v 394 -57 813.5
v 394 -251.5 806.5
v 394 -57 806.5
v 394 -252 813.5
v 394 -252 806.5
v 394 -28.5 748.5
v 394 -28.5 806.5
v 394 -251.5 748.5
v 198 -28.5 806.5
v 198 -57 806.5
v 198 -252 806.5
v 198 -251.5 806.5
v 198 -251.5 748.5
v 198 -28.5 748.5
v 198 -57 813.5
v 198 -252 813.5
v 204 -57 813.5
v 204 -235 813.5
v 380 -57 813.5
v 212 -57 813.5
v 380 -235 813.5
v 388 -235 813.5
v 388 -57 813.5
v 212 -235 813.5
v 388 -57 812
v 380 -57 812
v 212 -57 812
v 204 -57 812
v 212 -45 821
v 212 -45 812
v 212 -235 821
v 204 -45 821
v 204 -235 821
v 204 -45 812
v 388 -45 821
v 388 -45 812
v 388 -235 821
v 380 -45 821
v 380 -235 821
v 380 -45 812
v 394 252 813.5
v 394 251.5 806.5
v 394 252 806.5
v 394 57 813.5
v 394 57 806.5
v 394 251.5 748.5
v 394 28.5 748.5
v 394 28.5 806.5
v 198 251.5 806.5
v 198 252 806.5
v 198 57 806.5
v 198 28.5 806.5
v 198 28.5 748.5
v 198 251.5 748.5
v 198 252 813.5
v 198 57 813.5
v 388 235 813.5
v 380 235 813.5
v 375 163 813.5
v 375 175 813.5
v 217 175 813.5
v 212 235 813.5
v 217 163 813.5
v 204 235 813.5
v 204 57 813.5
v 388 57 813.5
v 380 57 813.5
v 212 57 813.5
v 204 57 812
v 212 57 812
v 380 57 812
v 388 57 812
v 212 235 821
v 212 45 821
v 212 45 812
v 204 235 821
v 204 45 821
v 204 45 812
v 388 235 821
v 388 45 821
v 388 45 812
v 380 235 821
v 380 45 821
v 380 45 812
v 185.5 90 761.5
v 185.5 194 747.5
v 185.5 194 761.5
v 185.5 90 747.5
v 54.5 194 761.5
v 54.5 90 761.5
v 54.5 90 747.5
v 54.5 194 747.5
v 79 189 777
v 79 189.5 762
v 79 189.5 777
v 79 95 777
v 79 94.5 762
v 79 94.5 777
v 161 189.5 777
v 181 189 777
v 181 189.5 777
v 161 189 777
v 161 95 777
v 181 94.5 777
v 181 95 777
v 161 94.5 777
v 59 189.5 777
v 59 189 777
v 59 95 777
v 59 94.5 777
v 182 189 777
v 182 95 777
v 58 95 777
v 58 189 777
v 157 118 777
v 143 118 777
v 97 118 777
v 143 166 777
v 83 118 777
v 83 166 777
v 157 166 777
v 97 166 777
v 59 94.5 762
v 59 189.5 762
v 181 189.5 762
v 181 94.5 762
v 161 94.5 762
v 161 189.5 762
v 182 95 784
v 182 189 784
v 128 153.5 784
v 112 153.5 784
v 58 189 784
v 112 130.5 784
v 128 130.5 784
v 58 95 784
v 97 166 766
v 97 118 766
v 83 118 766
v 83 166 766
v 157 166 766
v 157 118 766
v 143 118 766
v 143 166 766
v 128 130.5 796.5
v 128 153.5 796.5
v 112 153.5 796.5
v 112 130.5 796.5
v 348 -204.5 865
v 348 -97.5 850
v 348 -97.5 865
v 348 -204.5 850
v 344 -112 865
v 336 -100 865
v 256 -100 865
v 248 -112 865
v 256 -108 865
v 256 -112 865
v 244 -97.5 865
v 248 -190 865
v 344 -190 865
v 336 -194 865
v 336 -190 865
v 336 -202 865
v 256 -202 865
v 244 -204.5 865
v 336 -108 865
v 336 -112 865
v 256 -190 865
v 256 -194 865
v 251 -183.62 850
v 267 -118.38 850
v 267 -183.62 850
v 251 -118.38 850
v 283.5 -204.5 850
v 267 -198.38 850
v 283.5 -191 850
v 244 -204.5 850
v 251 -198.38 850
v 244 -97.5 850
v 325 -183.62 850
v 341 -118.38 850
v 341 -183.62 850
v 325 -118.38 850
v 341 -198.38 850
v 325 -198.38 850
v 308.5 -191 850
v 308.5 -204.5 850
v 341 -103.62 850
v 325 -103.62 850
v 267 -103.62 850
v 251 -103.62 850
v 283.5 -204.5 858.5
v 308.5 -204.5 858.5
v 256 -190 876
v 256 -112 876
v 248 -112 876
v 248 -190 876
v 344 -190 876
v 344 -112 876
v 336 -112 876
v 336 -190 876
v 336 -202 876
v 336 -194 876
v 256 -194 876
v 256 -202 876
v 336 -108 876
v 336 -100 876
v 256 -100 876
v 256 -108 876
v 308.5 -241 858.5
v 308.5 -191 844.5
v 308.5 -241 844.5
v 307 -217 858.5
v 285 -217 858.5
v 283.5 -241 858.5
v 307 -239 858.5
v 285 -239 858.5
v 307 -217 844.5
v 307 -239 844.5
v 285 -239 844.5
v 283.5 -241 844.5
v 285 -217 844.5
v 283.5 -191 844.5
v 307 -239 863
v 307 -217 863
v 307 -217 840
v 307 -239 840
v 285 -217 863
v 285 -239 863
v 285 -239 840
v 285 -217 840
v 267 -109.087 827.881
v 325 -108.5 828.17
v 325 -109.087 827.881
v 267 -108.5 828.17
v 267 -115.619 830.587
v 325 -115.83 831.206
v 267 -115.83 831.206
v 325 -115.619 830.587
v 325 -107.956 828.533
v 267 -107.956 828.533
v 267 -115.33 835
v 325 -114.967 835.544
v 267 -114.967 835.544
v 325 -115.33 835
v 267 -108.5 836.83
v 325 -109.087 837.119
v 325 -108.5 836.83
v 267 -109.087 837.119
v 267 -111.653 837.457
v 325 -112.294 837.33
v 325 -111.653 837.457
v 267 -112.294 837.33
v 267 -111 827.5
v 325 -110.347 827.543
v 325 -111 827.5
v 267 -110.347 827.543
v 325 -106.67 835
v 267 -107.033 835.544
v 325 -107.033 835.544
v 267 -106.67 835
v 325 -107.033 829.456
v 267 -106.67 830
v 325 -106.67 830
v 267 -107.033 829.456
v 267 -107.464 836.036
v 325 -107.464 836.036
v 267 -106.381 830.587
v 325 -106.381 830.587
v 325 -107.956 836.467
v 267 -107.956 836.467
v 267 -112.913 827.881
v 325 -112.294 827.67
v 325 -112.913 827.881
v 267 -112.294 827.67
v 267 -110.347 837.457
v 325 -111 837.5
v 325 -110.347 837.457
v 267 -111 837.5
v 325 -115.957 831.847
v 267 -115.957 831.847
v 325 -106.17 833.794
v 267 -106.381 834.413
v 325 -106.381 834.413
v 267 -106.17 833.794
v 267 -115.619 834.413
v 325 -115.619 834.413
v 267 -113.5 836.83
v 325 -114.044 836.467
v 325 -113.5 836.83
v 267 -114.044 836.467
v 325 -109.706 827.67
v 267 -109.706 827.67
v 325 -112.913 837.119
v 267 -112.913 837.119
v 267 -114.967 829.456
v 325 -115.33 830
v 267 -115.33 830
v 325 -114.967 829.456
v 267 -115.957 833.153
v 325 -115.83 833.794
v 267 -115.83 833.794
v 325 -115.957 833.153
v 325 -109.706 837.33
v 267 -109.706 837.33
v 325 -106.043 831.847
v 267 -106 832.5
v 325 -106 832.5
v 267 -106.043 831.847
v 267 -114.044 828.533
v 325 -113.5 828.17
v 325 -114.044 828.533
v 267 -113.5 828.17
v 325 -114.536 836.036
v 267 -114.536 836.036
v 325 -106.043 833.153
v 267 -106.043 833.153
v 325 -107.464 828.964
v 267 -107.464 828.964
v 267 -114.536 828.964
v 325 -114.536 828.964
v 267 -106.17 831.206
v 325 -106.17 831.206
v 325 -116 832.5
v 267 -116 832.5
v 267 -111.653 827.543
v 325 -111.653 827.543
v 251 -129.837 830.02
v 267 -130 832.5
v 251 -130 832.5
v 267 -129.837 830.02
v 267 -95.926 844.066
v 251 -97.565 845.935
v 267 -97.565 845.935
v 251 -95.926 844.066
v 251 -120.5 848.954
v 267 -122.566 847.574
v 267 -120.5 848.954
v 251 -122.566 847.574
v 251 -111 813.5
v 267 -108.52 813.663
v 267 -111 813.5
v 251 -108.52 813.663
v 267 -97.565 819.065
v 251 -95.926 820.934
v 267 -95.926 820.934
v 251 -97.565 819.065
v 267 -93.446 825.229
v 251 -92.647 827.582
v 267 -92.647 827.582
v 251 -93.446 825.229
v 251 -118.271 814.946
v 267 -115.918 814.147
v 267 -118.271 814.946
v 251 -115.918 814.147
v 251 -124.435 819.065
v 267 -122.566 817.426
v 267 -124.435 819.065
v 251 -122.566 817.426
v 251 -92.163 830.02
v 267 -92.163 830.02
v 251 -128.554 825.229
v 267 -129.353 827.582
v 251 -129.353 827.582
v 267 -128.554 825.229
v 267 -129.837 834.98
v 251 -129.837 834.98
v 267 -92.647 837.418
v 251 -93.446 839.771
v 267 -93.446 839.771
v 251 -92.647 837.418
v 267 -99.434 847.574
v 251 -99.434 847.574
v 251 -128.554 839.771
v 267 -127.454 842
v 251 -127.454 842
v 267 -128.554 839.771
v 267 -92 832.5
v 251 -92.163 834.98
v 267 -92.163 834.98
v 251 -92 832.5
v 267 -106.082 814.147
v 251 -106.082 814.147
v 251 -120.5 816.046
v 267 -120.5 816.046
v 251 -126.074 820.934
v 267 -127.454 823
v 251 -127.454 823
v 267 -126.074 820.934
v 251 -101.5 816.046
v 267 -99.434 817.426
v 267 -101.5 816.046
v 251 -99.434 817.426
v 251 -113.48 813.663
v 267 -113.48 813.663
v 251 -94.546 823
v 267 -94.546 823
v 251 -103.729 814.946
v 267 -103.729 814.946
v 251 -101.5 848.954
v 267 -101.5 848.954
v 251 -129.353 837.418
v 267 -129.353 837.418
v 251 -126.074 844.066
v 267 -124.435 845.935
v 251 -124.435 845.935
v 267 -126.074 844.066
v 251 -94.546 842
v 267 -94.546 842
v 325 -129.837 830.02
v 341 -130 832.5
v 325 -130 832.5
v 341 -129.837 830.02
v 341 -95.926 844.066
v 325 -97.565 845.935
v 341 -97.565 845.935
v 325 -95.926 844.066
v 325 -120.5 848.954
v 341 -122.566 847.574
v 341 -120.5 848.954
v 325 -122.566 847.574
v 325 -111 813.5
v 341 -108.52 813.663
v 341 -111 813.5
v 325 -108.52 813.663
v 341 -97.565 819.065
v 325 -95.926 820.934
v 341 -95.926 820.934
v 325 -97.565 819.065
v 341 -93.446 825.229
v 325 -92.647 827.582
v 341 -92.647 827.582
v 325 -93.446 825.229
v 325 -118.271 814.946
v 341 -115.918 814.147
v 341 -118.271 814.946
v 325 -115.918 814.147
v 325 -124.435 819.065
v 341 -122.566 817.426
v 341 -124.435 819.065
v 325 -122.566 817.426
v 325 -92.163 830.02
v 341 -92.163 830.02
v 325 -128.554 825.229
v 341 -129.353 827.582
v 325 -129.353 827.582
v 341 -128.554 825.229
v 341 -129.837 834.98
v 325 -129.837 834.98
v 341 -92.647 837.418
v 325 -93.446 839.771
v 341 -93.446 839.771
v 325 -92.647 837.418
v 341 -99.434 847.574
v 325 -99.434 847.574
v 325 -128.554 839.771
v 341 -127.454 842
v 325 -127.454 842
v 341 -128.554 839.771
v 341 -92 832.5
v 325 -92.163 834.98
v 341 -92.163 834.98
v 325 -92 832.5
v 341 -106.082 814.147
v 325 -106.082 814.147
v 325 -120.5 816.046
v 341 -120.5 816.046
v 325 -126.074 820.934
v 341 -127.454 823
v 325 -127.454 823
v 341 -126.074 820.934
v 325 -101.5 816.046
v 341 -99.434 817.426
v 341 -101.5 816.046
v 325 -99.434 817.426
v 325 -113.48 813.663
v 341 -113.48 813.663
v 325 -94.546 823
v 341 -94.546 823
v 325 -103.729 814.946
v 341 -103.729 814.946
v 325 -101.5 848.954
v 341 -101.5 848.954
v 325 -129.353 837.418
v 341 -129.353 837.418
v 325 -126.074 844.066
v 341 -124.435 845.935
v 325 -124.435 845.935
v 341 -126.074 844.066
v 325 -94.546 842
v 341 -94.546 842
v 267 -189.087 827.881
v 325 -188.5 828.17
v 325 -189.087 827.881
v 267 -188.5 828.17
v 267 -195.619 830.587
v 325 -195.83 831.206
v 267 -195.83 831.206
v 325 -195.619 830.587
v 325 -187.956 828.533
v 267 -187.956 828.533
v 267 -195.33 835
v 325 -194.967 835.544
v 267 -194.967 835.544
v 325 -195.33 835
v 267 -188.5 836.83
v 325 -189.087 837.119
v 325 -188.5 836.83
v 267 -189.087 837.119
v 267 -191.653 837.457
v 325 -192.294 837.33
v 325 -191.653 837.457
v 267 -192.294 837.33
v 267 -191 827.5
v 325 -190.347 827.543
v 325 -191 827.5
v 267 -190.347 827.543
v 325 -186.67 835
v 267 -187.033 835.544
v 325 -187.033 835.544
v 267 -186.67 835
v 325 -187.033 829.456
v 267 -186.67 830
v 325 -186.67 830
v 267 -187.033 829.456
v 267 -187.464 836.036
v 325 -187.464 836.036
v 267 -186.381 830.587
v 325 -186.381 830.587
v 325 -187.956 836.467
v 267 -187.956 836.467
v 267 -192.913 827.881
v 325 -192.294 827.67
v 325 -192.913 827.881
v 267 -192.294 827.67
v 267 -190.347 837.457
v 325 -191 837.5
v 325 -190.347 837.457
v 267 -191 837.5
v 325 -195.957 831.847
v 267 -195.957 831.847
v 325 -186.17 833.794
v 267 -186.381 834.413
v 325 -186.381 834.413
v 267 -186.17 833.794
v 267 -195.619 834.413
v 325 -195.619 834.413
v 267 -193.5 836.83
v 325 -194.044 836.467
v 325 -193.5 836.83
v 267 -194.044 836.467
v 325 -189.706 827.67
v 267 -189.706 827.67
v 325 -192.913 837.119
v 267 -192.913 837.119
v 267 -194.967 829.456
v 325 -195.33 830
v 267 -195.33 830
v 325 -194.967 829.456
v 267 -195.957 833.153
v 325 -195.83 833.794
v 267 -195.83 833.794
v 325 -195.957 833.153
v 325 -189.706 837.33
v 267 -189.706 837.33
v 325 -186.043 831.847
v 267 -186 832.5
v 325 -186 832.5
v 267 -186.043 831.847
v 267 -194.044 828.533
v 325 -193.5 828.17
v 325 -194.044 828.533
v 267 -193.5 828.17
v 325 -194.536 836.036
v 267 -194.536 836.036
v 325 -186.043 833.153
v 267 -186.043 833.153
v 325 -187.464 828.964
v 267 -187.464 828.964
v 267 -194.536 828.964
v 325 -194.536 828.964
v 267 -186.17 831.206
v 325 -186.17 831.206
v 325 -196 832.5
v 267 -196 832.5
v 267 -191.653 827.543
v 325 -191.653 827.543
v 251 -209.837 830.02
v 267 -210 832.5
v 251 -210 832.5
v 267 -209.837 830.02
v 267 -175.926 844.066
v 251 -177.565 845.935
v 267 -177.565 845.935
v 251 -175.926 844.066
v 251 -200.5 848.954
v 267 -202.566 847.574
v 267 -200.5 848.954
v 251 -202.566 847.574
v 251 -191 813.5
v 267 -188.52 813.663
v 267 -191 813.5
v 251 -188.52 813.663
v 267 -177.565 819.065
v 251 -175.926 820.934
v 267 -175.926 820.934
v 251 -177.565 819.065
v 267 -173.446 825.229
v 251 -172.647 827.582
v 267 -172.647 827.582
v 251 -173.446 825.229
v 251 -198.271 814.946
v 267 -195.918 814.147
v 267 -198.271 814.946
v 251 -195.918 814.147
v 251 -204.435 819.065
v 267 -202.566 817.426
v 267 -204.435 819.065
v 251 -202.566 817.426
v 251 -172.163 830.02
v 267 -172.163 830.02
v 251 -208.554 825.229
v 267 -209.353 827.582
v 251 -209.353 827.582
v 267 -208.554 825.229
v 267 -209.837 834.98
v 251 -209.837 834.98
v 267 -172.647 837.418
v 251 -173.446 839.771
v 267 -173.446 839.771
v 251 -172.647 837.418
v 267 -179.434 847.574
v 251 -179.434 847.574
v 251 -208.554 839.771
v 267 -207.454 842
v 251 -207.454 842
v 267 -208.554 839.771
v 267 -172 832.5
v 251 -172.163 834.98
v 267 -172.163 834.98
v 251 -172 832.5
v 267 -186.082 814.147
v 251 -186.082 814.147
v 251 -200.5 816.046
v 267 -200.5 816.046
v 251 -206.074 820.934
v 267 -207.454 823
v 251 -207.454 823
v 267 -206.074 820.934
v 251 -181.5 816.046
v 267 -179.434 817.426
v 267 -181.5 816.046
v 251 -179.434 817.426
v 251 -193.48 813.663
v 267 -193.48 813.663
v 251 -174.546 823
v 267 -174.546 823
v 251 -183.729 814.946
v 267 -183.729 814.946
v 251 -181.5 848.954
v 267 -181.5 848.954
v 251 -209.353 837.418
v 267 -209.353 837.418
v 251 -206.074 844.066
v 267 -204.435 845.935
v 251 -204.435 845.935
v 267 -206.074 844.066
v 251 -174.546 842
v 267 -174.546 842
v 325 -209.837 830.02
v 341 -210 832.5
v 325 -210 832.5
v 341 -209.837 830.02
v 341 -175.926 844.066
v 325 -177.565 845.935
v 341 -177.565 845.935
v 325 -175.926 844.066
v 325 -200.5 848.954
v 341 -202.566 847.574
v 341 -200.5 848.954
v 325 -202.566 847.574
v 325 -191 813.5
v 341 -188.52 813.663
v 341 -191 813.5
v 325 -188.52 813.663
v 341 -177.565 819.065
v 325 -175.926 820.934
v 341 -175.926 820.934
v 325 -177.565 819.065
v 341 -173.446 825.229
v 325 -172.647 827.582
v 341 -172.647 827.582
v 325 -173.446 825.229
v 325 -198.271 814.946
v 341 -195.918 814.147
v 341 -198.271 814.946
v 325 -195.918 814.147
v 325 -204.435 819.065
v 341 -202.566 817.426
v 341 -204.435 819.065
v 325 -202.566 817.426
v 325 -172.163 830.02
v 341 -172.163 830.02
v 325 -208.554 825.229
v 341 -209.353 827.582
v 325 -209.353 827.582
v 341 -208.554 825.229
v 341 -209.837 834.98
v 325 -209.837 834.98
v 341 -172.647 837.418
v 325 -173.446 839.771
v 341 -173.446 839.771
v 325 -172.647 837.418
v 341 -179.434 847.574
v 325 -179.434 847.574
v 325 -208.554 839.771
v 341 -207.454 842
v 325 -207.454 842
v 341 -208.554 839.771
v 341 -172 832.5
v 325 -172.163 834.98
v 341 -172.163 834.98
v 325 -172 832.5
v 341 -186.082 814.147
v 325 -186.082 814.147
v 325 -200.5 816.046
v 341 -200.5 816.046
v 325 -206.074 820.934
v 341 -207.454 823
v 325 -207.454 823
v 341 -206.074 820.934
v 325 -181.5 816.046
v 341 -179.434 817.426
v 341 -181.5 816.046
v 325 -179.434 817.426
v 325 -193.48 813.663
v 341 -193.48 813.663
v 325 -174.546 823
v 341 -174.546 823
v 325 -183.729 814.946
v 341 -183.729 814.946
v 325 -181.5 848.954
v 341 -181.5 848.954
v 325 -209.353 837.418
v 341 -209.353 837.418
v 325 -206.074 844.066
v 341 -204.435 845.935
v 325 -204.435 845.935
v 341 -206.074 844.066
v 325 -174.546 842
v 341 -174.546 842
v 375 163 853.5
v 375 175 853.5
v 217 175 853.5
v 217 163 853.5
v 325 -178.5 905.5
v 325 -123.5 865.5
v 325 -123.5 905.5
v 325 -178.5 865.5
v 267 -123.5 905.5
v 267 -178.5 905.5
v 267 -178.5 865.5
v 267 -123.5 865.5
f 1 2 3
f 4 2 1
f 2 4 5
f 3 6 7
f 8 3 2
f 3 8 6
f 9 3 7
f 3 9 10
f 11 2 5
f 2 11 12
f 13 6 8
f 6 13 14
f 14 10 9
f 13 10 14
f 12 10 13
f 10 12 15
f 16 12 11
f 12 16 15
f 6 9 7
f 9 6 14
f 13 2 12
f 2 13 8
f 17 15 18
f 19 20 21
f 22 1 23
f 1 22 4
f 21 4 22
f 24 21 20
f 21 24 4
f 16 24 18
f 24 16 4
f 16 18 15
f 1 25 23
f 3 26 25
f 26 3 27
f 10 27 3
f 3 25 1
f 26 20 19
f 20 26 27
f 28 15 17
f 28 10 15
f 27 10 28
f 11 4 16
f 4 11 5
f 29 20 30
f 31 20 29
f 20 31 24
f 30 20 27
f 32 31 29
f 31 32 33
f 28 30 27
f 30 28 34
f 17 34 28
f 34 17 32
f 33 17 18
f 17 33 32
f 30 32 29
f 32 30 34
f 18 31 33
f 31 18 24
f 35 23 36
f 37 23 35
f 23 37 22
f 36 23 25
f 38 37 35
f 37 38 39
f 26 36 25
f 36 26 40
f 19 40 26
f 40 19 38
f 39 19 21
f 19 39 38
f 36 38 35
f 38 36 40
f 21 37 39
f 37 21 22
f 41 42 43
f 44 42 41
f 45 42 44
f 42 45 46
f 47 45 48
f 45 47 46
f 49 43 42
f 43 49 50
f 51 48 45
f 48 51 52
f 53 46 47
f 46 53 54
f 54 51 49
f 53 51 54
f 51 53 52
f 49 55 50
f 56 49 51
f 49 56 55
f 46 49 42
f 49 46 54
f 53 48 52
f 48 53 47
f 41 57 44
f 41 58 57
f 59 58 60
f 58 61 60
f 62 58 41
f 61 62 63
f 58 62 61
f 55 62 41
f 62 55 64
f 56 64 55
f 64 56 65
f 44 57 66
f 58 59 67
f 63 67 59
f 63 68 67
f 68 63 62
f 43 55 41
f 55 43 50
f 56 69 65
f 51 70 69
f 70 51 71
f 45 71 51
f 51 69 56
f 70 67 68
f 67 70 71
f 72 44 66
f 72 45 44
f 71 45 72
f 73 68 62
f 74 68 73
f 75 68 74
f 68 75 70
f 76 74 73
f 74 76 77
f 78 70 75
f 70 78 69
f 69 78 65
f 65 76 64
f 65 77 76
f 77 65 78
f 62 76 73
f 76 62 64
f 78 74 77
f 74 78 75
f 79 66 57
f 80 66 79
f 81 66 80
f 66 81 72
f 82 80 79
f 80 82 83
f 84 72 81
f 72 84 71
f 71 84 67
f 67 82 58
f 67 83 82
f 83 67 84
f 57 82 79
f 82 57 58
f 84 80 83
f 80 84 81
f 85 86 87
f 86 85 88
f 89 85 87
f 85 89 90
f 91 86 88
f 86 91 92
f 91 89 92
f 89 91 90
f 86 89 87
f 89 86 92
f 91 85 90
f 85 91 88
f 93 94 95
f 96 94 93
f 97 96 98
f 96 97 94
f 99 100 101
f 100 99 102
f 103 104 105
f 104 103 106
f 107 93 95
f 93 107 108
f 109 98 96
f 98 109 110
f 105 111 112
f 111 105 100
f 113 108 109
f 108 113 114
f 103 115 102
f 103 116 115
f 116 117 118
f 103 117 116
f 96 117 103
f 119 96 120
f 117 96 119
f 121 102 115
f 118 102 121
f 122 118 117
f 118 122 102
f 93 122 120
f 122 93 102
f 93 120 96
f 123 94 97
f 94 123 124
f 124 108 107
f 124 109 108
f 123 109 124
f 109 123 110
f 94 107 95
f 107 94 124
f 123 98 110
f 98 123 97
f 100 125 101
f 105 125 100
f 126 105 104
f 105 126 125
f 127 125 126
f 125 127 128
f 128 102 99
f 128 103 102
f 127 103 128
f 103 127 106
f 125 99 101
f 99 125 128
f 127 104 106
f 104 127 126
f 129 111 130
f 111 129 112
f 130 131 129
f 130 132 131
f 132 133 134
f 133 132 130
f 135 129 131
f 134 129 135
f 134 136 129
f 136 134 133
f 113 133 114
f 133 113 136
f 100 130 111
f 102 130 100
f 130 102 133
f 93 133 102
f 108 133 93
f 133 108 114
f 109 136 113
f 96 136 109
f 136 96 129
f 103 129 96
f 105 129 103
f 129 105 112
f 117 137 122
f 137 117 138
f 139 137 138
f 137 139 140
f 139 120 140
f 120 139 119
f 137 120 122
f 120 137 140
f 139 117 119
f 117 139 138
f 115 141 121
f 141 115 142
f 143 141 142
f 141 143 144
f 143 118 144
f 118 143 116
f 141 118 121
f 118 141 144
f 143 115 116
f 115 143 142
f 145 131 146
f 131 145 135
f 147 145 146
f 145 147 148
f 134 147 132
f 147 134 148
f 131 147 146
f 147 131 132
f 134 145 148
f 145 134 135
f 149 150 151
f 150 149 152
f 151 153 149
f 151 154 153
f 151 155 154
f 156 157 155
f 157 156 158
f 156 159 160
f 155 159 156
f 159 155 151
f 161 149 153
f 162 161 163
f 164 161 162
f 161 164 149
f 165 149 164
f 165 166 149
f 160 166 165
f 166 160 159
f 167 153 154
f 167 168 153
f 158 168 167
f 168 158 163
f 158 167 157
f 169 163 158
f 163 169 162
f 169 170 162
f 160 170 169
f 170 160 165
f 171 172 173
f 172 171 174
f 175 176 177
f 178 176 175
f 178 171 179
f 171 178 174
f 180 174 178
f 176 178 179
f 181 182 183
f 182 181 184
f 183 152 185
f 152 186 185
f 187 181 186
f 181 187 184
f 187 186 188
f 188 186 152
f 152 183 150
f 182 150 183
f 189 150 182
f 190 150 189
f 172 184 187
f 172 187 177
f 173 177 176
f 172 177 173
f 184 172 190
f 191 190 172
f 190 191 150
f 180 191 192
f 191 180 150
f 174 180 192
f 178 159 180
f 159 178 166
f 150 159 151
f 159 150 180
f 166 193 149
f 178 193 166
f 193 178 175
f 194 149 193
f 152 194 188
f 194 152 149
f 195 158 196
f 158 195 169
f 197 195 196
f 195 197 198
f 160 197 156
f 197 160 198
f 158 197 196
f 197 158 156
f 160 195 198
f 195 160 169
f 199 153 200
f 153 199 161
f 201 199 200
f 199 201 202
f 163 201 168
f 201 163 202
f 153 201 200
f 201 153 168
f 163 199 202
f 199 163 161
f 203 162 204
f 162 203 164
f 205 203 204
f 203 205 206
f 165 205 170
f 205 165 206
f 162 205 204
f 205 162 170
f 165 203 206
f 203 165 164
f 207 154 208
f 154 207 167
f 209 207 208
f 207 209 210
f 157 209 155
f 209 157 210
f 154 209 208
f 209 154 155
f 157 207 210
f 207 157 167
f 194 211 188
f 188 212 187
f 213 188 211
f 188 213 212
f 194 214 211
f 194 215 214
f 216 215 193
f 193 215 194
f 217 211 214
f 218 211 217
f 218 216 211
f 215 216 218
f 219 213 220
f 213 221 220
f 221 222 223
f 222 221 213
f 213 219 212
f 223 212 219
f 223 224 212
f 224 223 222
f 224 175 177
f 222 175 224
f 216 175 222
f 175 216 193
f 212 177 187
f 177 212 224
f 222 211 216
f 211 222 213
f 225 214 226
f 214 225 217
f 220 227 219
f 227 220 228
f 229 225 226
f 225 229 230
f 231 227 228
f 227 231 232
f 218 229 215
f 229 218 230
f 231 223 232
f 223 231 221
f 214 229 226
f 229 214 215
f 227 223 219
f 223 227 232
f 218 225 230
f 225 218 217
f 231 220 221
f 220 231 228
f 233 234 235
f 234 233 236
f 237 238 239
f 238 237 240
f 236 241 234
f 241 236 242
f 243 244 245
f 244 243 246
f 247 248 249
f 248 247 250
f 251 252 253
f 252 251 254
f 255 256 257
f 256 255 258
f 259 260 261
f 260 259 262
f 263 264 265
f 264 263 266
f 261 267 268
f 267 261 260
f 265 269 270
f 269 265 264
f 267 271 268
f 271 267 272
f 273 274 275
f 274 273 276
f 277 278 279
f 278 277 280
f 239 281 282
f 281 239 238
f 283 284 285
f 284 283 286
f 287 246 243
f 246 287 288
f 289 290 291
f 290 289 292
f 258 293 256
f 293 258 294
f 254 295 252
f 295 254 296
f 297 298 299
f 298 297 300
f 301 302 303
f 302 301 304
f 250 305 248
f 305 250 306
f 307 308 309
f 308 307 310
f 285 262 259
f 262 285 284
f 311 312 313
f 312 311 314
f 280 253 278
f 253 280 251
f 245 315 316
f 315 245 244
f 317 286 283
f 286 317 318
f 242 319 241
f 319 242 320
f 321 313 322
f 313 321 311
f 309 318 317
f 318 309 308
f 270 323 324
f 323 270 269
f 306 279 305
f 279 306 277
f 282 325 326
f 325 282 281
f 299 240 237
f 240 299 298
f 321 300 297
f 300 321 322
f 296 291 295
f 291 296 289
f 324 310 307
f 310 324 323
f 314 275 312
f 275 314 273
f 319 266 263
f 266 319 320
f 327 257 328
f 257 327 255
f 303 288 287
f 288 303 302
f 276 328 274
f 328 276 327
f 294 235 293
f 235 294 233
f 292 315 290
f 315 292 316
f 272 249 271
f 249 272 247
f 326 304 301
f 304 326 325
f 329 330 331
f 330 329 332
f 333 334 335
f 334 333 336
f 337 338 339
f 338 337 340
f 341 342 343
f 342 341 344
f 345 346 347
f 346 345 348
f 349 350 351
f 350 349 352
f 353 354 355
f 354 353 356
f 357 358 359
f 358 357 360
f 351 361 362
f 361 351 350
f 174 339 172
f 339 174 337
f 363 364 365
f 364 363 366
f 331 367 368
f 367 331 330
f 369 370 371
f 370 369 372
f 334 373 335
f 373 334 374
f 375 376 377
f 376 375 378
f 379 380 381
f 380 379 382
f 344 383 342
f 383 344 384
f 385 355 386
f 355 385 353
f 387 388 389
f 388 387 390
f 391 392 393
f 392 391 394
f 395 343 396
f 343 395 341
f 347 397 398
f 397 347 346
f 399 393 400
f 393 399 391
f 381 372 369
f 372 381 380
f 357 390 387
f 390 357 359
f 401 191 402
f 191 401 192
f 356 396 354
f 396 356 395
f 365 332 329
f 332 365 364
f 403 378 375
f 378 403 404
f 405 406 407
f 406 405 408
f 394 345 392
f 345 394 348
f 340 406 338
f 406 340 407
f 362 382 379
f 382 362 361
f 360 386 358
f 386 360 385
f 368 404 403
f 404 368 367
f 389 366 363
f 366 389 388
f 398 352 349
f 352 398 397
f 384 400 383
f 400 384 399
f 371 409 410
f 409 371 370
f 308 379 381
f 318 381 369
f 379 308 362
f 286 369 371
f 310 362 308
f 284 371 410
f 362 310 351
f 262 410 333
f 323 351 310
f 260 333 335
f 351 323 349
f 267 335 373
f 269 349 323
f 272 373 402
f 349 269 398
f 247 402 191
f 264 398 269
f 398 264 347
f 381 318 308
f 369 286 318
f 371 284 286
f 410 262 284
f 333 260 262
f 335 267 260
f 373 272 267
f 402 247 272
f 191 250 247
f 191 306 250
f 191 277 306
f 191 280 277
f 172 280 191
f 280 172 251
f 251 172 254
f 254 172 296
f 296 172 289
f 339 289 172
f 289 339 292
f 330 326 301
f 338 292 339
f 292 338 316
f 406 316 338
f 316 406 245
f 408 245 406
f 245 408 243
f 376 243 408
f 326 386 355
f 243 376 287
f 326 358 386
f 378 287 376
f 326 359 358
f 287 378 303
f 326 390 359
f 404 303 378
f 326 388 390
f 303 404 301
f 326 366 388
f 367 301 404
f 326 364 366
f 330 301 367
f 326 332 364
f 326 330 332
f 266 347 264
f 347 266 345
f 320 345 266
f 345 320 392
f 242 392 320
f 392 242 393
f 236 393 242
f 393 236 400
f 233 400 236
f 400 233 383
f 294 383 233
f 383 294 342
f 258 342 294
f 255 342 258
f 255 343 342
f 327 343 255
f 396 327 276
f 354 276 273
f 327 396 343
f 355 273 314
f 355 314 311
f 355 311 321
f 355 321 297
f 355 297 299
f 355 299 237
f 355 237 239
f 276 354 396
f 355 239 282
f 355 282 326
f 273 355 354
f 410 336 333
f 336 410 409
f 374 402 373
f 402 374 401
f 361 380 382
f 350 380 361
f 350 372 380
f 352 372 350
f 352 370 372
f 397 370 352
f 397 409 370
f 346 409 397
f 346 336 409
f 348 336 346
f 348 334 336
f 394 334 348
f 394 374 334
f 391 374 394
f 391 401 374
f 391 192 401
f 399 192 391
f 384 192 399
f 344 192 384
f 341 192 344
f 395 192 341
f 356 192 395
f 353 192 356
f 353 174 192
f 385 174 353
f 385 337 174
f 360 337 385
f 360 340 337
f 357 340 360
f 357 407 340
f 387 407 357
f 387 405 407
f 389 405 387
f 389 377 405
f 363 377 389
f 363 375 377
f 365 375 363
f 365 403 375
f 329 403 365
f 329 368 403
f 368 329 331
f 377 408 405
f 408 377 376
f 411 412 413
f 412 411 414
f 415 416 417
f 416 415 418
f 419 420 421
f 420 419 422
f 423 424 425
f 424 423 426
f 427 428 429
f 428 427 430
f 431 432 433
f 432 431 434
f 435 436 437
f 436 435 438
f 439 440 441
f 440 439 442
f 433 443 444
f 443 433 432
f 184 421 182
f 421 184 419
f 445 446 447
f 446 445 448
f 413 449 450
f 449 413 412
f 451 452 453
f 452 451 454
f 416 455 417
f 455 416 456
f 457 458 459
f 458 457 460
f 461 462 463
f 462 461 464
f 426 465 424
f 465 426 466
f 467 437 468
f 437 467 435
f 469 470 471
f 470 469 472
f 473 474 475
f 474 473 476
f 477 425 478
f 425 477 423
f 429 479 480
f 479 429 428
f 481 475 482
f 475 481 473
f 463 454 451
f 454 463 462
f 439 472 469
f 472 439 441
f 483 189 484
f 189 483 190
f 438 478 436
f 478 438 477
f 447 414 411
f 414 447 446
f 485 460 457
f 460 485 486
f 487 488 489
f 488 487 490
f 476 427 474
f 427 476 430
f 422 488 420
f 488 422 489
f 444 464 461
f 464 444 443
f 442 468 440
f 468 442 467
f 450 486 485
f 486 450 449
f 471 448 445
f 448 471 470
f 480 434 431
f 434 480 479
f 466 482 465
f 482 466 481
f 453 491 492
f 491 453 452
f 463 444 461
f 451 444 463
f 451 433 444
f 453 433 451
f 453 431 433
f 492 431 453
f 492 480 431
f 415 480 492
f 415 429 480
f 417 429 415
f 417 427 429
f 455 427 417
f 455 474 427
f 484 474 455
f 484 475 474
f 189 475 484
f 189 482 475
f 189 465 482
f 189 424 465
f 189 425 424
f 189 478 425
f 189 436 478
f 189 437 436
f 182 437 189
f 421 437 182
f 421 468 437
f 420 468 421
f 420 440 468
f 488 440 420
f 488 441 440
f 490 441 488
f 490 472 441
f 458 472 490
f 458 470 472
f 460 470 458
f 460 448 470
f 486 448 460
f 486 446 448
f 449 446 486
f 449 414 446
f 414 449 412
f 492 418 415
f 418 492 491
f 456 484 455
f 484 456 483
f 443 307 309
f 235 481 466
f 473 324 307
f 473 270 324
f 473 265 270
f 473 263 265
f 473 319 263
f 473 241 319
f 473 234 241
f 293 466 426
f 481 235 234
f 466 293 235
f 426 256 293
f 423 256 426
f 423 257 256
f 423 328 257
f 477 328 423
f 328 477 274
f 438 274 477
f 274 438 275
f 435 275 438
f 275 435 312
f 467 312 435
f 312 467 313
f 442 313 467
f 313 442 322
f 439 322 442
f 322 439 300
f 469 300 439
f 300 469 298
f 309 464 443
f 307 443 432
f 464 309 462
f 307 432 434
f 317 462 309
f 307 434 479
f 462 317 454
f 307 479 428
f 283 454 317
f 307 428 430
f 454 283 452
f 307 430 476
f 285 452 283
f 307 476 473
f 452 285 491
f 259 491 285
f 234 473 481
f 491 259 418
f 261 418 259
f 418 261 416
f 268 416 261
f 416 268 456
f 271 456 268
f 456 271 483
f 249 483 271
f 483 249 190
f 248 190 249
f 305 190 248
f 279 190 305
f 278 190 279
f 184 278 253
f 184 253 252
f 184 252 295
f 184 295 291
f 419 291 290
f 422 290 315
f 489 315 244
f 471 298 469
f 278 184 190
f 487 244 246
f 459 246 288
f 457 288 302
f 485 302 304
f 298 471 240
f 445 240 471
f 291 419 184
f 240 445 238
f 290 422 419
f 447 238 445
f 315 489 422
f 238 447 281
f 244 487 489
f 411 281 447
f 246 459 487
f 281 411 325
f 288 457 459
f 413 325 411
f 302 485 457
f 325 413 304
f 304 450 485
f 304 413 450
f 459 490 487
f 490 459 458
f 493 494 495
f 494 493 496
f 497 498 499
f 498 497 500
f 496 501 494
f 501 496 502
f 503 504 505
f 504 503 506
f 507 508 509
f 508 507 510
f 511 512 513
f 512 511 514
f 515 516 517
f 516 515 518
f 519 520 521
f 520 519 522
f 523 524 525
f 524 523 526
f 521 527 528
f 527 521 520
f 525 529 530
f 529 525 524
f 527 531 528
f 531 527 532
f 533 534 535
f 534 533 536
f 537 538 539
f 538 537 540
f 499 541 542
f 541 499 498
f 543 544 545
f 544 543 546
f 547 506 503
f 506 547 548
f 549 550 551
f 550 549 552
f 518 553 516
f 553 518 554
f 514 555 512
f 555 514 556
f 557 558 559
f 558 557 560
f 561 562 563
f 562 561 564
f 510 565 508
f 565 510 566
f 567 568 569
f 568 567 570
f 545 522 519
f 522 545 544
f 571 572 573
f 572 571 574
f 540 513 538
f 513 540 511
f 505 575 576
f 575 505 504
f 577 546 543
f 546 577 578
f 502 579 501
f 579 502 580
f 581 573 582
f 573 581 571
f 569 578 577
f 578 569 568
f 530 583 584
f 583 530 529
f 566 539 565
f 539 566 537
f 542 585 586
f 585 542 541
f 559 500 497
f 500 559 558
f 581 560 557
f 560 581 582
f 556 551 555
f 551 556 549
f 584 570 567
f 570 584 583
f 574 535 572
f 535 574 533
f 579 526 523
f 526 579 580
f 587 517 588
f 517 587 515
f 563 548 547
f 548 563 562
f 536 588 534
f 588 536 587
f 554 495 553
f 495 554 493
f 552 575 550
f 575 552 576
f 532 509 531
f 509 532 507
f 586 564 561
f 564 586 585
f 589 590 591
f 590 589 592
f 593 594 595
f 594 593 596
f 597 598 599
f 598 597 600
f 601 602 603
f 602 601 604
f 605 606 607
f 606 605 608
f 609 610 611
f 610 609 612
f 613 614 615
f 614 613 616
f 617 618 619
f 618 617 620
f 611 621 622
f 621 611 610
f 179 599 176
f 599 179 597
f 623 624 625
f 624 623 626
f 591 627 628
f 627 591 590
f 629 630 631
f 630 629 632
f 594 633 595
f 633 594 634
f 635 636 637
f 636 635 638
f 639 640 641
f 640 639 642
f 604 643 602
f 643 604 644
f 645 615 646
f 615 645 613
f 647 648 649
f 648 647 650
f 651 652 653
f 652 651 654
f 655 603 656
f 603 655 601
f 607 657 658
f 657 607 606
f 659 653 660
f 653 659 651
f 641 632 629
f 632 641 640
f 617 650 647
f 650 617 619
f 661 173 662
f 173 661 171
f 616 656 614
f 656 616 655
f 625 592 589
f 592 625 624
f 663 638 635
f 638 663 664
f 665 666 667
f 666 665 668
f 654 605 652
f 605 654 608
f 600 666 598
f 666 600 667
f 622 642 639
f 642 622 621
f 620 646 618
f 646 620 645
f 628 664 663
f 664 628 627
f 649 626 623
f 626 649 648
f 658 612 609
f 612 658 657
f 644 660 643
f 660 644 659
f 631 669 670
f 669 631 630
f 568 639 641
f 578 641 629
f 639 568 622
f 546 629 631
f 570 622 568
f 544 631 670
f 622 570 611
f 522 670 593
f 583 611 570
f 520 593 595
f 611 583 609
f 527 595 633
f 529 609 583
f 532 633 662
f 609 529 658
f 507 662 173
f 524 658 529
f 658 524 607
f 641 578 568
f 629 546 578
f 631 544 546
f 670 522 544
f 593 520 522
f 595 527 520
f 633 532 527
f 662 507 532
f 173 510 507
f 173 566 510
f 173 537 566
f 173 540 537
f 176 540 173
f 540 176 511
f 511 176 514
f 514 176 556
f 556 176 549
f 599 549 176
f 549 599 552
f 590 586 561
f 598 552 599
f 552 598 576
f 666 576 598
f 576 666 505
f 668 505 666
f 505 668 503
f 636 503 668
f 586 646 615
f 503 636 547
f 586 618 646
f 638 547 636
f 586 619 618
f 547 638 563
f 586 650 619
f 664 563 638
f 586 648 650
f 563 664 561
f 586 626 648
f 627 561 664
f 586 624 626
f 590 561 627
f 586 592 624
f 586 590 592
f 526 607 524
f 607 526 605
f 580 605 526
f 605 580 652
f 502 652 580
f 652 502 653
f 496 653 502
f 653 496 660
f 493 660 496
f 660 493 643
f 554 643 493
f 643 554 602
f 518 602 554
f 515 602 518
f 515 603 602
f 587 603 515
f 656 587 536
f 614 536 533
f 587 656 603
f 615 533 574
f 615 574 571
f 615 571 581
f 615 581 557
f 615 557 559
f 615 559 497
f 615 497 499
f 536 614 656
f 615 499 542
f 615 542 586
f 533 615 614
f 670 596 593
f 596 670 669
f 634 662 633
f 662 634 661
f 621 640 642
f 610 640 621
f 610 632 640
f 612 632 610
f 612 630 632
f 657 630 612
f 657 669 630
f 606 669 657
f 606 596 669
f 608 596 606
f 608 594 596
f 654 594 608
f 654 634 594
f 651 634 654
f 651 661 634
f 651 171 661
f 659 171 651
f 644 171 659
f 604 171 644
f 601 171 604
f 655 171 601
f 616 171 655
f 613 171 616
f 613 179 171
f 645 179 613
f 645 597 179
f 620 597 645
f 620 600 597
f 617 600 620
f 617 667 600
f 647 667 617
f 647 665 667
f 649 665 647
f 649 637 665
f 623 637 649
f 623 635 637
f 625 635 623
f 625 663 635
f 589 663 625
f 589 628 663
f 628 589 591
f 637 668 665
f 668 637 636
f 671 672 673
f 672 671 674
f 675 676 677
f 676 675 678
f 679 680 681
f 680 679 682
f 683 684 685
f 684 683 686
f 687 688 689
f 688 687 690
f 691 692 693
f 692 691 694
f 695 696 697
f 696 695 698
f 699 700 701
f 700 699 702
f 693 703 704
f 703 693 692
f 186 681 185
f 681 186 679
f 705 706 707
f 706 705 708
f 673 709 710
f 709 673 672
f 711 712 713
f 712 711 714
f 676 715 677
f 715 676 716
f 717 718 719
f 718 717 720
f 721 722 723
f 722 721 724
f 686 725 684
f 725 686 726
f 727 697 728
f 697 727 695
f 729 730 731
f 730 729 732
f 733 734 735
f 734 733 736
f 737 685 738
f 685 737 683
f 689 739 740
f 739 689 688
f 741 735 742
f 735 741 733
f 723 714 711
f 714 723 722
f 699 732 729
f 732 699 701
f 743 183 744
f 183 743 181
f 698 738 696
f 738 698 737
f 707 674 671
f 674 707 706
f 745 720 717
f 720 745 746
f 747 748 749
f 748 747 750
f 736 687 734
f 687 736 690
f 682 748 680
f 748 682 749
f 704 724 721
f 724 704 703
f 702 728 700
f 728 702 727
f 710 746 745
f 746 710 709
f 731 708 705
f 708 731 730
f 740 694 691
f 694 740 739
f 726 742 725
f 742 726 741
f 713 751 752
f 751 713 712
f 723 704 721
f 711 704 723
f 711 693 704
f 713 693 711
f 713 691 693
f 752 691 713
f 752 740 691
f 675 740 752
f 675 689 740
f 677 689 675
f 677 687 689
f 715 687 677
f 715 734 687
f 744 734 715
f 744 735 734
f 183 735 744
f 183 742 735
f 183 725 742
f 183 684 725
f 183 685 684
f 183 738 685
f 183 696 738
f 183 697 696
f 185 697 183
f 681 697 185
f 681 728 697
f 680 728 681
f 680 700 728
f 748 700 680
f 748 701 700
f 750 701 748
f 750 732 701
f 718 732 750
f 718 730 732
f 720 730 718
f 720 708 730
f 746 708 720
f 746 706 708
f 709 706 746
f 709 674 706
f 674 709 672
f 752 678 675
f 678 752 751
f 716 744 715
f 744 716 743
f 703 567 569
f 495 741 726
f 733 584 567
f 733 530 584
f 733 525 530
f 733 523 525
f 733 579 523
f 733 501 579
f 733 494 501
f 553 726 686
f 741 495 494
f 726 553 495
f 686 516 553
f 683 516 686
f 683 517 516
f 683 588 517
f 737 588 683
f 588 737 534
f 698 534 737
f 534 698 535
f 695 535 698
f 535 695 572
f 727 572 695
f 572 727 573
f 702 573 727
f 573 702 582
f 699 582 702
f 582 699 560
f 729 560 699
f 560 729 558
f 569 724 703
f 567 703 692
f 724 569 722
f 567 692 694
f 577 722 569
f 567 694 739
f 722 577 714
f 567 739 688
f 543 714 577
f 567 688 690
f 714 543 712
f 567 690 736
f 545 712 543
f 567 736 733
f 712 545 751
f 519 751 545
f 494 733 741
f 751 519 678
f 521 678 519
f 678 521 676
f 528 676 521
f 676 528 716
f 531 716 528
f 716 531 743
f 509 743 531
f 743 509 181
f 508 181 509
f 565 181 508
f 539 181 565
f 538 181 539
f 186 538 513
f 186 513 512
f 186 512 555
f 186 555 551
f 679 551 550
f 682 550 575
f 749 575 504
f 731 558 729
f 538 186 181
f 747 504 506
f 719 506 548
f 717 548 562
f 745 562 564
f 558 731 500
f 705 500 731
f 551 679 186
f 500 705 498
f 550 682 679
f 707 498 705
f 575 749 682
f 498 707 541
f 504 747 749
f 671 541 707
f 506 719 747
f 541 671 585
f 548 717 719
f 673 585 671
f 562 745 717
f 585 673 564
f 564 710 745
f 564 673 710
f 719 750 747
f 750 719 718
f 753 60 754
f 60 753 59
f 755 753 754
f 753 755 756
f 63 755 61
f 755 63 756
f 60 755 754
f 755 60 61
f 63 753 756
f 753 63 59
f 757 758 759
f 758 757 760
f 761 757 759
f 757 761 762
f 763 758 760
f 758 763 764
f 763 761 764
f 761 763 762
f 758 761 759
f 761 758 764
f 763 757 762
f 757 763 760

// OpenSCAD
// Millimetre geometric reference; use real functional tools, not printed heated or cutting equipment.
// Source SHA-256: 2a0534bf03a3a449a10b4e73da6e93da54e76e3affcbfef08af7dff53fa675af
$fn=48;
module entry_deck(){
translate([0, 0, 0]) rotate([0, 0, 0]) cube([196, 223, 58],center=true);
translate([0, -14.5, 32.5]) rotate([0, 0, 0]) cube([196, 195, 7],center=true);
translate([0, 97, 25]) rotate([0, 0, 0]) cube([196, 28, 8],center=true);
translate([-88, 0, 39]) rotate([0, 0, 0]) cube([8, 190, 9],center=true);
translate([88, 0, 39]) rotate([0, 0, 0]) cube([8, 190, 9],center=true);
}
module exit_deck(){
translate([0, 0, 0]) rotate([0, 0, 0]) cube([196, 223, 58],center=true);
translate([0, 14.5, 32.5]) rotate([0, 0, 0]) cube([196, 195, 7],center=true);
translate([0, -97, 25]) rotate([0, 0, 0]) cube([196, 28, 8],center=true);
translate([-88, 0, 39]) rotate([0, 0, 0]) cube([8, 190, 9],center=true);
translate([88, 0, 39]) rotate([0, 0, 0]) cube([8, 190, 9],center=true);
}
module cart_stop(){
translate([0, 0, 0]) rotate([0, 0, 0]) cube([158, 12, 40],center=true);
}
module bridge_rest(){
translate([0, 0, 0]) rotate([0, 0, 0]) cube([131, 104, 14],center=true);
translate([-51, 0, 15]) rotate([0, 0, 0]) cube([20, 95, 15],center=true);
translate([51, 0, 15]) rotate([0, 0, 0]) cube([20, 95, 15],center=true);
}
module bridge_plate(){
translate([0, 0, 0]) rotate([0, 0, 0]) cube([124, 94, 7],center=true);
translate([-30, 0, -9]) rotate([0, 0, 0]) cube([14, 48, 11],center=true);
translate([30, 0, -9]) rotate([0, 0, 0]) cube([14, 48, 11],center=true);
translate([0, 0, 9]) rotate([0, 0, 0]) cube([16, 23, 14],center=true);
}
module loaded_cart(){
translate([0, 0, 0]) rotate([0, 0, 0]) cube([104, 107, 15],center=true);
translate([-44, 0, 10]) rotate([0, 0, 0]) cube([8, 78, 17],center=true);
translate([44, 0, 10]) rotate([0, 0, 0]) cube([8, 78, 17],center=true);
translate([0, -47, 10]) rotate([0, 0, 0]) cube([80, 8, 17],center=true);
translate([0, 47, 10]) rotate([0, 0, 0]) cube([80, 8, 17],center=true);
translate([0, -65, -6]) rotate([0, 0, 0]) cube([25, 50, 14],center=true);
translate([0, -77, -6]) rotate([0, 0, 0]) cube([22, 22, 23],center=true);
}
module front_axle(){
translate([0, 0, 0]) rotate([0, 0, 0]) rotate([0,90,0]) cylinder(r=5,h=86,center=true);
translate([-37, 0, 0]) rotate([0, 0, 0]) rotate([0,90,0]) cylinder(r=19,h=16,center=true);
translate([37, 0, 0]) rotate([0, 0, 0]) rotate([0,90,0]) cylinder(r=19,h=16,center=true);
}
module rear_axle(){
translate([0, 0, 0]) rotate([0, 0, 0]) rotate([0,90,0]) cylinder(r=5,h=86,center=true);
translate([-37, 0, 0]) rotate([0, 0, 0]) rotate([0,90,0]) cylinder(r=19,h=16,center=true);
translate([37, 0, 0]) rotate([0, 0, 0]) rotate([0,90,0]) cylinder(r=19,h=16,center=true);
}
module cart_load(){
translate([0, 0, 0]) rotate([0, 0, 0]) cube([58, 55, 40],center=true);
}
translate([296, -140, 777.5]) rotate([0,0,0]) entry_deck();
translate([296, 140, 777.5]) rotate([0,0,0]) exit_deck();
translate([296, 169, 833.5]) rotate([0,0,0]) cart_stop();
translate([120, 142, 754.5]) rotate([0,0,0]) bridge_rest();
translate([120, 142, 780.5]) rotate([0,0,0]) bridge_plate();
translate([296, -151, 857.5]) rotate([0,0,0]) loaded_cart();
translate([296, -111, 832.5]) rotate([0,0,0]) front_axle();
translate([296, -191, 832.5]) rotate([0,0,0]) rear_axle();
translate([296, -151, 885.5]) rotate([0,0,0]) cart_load();
